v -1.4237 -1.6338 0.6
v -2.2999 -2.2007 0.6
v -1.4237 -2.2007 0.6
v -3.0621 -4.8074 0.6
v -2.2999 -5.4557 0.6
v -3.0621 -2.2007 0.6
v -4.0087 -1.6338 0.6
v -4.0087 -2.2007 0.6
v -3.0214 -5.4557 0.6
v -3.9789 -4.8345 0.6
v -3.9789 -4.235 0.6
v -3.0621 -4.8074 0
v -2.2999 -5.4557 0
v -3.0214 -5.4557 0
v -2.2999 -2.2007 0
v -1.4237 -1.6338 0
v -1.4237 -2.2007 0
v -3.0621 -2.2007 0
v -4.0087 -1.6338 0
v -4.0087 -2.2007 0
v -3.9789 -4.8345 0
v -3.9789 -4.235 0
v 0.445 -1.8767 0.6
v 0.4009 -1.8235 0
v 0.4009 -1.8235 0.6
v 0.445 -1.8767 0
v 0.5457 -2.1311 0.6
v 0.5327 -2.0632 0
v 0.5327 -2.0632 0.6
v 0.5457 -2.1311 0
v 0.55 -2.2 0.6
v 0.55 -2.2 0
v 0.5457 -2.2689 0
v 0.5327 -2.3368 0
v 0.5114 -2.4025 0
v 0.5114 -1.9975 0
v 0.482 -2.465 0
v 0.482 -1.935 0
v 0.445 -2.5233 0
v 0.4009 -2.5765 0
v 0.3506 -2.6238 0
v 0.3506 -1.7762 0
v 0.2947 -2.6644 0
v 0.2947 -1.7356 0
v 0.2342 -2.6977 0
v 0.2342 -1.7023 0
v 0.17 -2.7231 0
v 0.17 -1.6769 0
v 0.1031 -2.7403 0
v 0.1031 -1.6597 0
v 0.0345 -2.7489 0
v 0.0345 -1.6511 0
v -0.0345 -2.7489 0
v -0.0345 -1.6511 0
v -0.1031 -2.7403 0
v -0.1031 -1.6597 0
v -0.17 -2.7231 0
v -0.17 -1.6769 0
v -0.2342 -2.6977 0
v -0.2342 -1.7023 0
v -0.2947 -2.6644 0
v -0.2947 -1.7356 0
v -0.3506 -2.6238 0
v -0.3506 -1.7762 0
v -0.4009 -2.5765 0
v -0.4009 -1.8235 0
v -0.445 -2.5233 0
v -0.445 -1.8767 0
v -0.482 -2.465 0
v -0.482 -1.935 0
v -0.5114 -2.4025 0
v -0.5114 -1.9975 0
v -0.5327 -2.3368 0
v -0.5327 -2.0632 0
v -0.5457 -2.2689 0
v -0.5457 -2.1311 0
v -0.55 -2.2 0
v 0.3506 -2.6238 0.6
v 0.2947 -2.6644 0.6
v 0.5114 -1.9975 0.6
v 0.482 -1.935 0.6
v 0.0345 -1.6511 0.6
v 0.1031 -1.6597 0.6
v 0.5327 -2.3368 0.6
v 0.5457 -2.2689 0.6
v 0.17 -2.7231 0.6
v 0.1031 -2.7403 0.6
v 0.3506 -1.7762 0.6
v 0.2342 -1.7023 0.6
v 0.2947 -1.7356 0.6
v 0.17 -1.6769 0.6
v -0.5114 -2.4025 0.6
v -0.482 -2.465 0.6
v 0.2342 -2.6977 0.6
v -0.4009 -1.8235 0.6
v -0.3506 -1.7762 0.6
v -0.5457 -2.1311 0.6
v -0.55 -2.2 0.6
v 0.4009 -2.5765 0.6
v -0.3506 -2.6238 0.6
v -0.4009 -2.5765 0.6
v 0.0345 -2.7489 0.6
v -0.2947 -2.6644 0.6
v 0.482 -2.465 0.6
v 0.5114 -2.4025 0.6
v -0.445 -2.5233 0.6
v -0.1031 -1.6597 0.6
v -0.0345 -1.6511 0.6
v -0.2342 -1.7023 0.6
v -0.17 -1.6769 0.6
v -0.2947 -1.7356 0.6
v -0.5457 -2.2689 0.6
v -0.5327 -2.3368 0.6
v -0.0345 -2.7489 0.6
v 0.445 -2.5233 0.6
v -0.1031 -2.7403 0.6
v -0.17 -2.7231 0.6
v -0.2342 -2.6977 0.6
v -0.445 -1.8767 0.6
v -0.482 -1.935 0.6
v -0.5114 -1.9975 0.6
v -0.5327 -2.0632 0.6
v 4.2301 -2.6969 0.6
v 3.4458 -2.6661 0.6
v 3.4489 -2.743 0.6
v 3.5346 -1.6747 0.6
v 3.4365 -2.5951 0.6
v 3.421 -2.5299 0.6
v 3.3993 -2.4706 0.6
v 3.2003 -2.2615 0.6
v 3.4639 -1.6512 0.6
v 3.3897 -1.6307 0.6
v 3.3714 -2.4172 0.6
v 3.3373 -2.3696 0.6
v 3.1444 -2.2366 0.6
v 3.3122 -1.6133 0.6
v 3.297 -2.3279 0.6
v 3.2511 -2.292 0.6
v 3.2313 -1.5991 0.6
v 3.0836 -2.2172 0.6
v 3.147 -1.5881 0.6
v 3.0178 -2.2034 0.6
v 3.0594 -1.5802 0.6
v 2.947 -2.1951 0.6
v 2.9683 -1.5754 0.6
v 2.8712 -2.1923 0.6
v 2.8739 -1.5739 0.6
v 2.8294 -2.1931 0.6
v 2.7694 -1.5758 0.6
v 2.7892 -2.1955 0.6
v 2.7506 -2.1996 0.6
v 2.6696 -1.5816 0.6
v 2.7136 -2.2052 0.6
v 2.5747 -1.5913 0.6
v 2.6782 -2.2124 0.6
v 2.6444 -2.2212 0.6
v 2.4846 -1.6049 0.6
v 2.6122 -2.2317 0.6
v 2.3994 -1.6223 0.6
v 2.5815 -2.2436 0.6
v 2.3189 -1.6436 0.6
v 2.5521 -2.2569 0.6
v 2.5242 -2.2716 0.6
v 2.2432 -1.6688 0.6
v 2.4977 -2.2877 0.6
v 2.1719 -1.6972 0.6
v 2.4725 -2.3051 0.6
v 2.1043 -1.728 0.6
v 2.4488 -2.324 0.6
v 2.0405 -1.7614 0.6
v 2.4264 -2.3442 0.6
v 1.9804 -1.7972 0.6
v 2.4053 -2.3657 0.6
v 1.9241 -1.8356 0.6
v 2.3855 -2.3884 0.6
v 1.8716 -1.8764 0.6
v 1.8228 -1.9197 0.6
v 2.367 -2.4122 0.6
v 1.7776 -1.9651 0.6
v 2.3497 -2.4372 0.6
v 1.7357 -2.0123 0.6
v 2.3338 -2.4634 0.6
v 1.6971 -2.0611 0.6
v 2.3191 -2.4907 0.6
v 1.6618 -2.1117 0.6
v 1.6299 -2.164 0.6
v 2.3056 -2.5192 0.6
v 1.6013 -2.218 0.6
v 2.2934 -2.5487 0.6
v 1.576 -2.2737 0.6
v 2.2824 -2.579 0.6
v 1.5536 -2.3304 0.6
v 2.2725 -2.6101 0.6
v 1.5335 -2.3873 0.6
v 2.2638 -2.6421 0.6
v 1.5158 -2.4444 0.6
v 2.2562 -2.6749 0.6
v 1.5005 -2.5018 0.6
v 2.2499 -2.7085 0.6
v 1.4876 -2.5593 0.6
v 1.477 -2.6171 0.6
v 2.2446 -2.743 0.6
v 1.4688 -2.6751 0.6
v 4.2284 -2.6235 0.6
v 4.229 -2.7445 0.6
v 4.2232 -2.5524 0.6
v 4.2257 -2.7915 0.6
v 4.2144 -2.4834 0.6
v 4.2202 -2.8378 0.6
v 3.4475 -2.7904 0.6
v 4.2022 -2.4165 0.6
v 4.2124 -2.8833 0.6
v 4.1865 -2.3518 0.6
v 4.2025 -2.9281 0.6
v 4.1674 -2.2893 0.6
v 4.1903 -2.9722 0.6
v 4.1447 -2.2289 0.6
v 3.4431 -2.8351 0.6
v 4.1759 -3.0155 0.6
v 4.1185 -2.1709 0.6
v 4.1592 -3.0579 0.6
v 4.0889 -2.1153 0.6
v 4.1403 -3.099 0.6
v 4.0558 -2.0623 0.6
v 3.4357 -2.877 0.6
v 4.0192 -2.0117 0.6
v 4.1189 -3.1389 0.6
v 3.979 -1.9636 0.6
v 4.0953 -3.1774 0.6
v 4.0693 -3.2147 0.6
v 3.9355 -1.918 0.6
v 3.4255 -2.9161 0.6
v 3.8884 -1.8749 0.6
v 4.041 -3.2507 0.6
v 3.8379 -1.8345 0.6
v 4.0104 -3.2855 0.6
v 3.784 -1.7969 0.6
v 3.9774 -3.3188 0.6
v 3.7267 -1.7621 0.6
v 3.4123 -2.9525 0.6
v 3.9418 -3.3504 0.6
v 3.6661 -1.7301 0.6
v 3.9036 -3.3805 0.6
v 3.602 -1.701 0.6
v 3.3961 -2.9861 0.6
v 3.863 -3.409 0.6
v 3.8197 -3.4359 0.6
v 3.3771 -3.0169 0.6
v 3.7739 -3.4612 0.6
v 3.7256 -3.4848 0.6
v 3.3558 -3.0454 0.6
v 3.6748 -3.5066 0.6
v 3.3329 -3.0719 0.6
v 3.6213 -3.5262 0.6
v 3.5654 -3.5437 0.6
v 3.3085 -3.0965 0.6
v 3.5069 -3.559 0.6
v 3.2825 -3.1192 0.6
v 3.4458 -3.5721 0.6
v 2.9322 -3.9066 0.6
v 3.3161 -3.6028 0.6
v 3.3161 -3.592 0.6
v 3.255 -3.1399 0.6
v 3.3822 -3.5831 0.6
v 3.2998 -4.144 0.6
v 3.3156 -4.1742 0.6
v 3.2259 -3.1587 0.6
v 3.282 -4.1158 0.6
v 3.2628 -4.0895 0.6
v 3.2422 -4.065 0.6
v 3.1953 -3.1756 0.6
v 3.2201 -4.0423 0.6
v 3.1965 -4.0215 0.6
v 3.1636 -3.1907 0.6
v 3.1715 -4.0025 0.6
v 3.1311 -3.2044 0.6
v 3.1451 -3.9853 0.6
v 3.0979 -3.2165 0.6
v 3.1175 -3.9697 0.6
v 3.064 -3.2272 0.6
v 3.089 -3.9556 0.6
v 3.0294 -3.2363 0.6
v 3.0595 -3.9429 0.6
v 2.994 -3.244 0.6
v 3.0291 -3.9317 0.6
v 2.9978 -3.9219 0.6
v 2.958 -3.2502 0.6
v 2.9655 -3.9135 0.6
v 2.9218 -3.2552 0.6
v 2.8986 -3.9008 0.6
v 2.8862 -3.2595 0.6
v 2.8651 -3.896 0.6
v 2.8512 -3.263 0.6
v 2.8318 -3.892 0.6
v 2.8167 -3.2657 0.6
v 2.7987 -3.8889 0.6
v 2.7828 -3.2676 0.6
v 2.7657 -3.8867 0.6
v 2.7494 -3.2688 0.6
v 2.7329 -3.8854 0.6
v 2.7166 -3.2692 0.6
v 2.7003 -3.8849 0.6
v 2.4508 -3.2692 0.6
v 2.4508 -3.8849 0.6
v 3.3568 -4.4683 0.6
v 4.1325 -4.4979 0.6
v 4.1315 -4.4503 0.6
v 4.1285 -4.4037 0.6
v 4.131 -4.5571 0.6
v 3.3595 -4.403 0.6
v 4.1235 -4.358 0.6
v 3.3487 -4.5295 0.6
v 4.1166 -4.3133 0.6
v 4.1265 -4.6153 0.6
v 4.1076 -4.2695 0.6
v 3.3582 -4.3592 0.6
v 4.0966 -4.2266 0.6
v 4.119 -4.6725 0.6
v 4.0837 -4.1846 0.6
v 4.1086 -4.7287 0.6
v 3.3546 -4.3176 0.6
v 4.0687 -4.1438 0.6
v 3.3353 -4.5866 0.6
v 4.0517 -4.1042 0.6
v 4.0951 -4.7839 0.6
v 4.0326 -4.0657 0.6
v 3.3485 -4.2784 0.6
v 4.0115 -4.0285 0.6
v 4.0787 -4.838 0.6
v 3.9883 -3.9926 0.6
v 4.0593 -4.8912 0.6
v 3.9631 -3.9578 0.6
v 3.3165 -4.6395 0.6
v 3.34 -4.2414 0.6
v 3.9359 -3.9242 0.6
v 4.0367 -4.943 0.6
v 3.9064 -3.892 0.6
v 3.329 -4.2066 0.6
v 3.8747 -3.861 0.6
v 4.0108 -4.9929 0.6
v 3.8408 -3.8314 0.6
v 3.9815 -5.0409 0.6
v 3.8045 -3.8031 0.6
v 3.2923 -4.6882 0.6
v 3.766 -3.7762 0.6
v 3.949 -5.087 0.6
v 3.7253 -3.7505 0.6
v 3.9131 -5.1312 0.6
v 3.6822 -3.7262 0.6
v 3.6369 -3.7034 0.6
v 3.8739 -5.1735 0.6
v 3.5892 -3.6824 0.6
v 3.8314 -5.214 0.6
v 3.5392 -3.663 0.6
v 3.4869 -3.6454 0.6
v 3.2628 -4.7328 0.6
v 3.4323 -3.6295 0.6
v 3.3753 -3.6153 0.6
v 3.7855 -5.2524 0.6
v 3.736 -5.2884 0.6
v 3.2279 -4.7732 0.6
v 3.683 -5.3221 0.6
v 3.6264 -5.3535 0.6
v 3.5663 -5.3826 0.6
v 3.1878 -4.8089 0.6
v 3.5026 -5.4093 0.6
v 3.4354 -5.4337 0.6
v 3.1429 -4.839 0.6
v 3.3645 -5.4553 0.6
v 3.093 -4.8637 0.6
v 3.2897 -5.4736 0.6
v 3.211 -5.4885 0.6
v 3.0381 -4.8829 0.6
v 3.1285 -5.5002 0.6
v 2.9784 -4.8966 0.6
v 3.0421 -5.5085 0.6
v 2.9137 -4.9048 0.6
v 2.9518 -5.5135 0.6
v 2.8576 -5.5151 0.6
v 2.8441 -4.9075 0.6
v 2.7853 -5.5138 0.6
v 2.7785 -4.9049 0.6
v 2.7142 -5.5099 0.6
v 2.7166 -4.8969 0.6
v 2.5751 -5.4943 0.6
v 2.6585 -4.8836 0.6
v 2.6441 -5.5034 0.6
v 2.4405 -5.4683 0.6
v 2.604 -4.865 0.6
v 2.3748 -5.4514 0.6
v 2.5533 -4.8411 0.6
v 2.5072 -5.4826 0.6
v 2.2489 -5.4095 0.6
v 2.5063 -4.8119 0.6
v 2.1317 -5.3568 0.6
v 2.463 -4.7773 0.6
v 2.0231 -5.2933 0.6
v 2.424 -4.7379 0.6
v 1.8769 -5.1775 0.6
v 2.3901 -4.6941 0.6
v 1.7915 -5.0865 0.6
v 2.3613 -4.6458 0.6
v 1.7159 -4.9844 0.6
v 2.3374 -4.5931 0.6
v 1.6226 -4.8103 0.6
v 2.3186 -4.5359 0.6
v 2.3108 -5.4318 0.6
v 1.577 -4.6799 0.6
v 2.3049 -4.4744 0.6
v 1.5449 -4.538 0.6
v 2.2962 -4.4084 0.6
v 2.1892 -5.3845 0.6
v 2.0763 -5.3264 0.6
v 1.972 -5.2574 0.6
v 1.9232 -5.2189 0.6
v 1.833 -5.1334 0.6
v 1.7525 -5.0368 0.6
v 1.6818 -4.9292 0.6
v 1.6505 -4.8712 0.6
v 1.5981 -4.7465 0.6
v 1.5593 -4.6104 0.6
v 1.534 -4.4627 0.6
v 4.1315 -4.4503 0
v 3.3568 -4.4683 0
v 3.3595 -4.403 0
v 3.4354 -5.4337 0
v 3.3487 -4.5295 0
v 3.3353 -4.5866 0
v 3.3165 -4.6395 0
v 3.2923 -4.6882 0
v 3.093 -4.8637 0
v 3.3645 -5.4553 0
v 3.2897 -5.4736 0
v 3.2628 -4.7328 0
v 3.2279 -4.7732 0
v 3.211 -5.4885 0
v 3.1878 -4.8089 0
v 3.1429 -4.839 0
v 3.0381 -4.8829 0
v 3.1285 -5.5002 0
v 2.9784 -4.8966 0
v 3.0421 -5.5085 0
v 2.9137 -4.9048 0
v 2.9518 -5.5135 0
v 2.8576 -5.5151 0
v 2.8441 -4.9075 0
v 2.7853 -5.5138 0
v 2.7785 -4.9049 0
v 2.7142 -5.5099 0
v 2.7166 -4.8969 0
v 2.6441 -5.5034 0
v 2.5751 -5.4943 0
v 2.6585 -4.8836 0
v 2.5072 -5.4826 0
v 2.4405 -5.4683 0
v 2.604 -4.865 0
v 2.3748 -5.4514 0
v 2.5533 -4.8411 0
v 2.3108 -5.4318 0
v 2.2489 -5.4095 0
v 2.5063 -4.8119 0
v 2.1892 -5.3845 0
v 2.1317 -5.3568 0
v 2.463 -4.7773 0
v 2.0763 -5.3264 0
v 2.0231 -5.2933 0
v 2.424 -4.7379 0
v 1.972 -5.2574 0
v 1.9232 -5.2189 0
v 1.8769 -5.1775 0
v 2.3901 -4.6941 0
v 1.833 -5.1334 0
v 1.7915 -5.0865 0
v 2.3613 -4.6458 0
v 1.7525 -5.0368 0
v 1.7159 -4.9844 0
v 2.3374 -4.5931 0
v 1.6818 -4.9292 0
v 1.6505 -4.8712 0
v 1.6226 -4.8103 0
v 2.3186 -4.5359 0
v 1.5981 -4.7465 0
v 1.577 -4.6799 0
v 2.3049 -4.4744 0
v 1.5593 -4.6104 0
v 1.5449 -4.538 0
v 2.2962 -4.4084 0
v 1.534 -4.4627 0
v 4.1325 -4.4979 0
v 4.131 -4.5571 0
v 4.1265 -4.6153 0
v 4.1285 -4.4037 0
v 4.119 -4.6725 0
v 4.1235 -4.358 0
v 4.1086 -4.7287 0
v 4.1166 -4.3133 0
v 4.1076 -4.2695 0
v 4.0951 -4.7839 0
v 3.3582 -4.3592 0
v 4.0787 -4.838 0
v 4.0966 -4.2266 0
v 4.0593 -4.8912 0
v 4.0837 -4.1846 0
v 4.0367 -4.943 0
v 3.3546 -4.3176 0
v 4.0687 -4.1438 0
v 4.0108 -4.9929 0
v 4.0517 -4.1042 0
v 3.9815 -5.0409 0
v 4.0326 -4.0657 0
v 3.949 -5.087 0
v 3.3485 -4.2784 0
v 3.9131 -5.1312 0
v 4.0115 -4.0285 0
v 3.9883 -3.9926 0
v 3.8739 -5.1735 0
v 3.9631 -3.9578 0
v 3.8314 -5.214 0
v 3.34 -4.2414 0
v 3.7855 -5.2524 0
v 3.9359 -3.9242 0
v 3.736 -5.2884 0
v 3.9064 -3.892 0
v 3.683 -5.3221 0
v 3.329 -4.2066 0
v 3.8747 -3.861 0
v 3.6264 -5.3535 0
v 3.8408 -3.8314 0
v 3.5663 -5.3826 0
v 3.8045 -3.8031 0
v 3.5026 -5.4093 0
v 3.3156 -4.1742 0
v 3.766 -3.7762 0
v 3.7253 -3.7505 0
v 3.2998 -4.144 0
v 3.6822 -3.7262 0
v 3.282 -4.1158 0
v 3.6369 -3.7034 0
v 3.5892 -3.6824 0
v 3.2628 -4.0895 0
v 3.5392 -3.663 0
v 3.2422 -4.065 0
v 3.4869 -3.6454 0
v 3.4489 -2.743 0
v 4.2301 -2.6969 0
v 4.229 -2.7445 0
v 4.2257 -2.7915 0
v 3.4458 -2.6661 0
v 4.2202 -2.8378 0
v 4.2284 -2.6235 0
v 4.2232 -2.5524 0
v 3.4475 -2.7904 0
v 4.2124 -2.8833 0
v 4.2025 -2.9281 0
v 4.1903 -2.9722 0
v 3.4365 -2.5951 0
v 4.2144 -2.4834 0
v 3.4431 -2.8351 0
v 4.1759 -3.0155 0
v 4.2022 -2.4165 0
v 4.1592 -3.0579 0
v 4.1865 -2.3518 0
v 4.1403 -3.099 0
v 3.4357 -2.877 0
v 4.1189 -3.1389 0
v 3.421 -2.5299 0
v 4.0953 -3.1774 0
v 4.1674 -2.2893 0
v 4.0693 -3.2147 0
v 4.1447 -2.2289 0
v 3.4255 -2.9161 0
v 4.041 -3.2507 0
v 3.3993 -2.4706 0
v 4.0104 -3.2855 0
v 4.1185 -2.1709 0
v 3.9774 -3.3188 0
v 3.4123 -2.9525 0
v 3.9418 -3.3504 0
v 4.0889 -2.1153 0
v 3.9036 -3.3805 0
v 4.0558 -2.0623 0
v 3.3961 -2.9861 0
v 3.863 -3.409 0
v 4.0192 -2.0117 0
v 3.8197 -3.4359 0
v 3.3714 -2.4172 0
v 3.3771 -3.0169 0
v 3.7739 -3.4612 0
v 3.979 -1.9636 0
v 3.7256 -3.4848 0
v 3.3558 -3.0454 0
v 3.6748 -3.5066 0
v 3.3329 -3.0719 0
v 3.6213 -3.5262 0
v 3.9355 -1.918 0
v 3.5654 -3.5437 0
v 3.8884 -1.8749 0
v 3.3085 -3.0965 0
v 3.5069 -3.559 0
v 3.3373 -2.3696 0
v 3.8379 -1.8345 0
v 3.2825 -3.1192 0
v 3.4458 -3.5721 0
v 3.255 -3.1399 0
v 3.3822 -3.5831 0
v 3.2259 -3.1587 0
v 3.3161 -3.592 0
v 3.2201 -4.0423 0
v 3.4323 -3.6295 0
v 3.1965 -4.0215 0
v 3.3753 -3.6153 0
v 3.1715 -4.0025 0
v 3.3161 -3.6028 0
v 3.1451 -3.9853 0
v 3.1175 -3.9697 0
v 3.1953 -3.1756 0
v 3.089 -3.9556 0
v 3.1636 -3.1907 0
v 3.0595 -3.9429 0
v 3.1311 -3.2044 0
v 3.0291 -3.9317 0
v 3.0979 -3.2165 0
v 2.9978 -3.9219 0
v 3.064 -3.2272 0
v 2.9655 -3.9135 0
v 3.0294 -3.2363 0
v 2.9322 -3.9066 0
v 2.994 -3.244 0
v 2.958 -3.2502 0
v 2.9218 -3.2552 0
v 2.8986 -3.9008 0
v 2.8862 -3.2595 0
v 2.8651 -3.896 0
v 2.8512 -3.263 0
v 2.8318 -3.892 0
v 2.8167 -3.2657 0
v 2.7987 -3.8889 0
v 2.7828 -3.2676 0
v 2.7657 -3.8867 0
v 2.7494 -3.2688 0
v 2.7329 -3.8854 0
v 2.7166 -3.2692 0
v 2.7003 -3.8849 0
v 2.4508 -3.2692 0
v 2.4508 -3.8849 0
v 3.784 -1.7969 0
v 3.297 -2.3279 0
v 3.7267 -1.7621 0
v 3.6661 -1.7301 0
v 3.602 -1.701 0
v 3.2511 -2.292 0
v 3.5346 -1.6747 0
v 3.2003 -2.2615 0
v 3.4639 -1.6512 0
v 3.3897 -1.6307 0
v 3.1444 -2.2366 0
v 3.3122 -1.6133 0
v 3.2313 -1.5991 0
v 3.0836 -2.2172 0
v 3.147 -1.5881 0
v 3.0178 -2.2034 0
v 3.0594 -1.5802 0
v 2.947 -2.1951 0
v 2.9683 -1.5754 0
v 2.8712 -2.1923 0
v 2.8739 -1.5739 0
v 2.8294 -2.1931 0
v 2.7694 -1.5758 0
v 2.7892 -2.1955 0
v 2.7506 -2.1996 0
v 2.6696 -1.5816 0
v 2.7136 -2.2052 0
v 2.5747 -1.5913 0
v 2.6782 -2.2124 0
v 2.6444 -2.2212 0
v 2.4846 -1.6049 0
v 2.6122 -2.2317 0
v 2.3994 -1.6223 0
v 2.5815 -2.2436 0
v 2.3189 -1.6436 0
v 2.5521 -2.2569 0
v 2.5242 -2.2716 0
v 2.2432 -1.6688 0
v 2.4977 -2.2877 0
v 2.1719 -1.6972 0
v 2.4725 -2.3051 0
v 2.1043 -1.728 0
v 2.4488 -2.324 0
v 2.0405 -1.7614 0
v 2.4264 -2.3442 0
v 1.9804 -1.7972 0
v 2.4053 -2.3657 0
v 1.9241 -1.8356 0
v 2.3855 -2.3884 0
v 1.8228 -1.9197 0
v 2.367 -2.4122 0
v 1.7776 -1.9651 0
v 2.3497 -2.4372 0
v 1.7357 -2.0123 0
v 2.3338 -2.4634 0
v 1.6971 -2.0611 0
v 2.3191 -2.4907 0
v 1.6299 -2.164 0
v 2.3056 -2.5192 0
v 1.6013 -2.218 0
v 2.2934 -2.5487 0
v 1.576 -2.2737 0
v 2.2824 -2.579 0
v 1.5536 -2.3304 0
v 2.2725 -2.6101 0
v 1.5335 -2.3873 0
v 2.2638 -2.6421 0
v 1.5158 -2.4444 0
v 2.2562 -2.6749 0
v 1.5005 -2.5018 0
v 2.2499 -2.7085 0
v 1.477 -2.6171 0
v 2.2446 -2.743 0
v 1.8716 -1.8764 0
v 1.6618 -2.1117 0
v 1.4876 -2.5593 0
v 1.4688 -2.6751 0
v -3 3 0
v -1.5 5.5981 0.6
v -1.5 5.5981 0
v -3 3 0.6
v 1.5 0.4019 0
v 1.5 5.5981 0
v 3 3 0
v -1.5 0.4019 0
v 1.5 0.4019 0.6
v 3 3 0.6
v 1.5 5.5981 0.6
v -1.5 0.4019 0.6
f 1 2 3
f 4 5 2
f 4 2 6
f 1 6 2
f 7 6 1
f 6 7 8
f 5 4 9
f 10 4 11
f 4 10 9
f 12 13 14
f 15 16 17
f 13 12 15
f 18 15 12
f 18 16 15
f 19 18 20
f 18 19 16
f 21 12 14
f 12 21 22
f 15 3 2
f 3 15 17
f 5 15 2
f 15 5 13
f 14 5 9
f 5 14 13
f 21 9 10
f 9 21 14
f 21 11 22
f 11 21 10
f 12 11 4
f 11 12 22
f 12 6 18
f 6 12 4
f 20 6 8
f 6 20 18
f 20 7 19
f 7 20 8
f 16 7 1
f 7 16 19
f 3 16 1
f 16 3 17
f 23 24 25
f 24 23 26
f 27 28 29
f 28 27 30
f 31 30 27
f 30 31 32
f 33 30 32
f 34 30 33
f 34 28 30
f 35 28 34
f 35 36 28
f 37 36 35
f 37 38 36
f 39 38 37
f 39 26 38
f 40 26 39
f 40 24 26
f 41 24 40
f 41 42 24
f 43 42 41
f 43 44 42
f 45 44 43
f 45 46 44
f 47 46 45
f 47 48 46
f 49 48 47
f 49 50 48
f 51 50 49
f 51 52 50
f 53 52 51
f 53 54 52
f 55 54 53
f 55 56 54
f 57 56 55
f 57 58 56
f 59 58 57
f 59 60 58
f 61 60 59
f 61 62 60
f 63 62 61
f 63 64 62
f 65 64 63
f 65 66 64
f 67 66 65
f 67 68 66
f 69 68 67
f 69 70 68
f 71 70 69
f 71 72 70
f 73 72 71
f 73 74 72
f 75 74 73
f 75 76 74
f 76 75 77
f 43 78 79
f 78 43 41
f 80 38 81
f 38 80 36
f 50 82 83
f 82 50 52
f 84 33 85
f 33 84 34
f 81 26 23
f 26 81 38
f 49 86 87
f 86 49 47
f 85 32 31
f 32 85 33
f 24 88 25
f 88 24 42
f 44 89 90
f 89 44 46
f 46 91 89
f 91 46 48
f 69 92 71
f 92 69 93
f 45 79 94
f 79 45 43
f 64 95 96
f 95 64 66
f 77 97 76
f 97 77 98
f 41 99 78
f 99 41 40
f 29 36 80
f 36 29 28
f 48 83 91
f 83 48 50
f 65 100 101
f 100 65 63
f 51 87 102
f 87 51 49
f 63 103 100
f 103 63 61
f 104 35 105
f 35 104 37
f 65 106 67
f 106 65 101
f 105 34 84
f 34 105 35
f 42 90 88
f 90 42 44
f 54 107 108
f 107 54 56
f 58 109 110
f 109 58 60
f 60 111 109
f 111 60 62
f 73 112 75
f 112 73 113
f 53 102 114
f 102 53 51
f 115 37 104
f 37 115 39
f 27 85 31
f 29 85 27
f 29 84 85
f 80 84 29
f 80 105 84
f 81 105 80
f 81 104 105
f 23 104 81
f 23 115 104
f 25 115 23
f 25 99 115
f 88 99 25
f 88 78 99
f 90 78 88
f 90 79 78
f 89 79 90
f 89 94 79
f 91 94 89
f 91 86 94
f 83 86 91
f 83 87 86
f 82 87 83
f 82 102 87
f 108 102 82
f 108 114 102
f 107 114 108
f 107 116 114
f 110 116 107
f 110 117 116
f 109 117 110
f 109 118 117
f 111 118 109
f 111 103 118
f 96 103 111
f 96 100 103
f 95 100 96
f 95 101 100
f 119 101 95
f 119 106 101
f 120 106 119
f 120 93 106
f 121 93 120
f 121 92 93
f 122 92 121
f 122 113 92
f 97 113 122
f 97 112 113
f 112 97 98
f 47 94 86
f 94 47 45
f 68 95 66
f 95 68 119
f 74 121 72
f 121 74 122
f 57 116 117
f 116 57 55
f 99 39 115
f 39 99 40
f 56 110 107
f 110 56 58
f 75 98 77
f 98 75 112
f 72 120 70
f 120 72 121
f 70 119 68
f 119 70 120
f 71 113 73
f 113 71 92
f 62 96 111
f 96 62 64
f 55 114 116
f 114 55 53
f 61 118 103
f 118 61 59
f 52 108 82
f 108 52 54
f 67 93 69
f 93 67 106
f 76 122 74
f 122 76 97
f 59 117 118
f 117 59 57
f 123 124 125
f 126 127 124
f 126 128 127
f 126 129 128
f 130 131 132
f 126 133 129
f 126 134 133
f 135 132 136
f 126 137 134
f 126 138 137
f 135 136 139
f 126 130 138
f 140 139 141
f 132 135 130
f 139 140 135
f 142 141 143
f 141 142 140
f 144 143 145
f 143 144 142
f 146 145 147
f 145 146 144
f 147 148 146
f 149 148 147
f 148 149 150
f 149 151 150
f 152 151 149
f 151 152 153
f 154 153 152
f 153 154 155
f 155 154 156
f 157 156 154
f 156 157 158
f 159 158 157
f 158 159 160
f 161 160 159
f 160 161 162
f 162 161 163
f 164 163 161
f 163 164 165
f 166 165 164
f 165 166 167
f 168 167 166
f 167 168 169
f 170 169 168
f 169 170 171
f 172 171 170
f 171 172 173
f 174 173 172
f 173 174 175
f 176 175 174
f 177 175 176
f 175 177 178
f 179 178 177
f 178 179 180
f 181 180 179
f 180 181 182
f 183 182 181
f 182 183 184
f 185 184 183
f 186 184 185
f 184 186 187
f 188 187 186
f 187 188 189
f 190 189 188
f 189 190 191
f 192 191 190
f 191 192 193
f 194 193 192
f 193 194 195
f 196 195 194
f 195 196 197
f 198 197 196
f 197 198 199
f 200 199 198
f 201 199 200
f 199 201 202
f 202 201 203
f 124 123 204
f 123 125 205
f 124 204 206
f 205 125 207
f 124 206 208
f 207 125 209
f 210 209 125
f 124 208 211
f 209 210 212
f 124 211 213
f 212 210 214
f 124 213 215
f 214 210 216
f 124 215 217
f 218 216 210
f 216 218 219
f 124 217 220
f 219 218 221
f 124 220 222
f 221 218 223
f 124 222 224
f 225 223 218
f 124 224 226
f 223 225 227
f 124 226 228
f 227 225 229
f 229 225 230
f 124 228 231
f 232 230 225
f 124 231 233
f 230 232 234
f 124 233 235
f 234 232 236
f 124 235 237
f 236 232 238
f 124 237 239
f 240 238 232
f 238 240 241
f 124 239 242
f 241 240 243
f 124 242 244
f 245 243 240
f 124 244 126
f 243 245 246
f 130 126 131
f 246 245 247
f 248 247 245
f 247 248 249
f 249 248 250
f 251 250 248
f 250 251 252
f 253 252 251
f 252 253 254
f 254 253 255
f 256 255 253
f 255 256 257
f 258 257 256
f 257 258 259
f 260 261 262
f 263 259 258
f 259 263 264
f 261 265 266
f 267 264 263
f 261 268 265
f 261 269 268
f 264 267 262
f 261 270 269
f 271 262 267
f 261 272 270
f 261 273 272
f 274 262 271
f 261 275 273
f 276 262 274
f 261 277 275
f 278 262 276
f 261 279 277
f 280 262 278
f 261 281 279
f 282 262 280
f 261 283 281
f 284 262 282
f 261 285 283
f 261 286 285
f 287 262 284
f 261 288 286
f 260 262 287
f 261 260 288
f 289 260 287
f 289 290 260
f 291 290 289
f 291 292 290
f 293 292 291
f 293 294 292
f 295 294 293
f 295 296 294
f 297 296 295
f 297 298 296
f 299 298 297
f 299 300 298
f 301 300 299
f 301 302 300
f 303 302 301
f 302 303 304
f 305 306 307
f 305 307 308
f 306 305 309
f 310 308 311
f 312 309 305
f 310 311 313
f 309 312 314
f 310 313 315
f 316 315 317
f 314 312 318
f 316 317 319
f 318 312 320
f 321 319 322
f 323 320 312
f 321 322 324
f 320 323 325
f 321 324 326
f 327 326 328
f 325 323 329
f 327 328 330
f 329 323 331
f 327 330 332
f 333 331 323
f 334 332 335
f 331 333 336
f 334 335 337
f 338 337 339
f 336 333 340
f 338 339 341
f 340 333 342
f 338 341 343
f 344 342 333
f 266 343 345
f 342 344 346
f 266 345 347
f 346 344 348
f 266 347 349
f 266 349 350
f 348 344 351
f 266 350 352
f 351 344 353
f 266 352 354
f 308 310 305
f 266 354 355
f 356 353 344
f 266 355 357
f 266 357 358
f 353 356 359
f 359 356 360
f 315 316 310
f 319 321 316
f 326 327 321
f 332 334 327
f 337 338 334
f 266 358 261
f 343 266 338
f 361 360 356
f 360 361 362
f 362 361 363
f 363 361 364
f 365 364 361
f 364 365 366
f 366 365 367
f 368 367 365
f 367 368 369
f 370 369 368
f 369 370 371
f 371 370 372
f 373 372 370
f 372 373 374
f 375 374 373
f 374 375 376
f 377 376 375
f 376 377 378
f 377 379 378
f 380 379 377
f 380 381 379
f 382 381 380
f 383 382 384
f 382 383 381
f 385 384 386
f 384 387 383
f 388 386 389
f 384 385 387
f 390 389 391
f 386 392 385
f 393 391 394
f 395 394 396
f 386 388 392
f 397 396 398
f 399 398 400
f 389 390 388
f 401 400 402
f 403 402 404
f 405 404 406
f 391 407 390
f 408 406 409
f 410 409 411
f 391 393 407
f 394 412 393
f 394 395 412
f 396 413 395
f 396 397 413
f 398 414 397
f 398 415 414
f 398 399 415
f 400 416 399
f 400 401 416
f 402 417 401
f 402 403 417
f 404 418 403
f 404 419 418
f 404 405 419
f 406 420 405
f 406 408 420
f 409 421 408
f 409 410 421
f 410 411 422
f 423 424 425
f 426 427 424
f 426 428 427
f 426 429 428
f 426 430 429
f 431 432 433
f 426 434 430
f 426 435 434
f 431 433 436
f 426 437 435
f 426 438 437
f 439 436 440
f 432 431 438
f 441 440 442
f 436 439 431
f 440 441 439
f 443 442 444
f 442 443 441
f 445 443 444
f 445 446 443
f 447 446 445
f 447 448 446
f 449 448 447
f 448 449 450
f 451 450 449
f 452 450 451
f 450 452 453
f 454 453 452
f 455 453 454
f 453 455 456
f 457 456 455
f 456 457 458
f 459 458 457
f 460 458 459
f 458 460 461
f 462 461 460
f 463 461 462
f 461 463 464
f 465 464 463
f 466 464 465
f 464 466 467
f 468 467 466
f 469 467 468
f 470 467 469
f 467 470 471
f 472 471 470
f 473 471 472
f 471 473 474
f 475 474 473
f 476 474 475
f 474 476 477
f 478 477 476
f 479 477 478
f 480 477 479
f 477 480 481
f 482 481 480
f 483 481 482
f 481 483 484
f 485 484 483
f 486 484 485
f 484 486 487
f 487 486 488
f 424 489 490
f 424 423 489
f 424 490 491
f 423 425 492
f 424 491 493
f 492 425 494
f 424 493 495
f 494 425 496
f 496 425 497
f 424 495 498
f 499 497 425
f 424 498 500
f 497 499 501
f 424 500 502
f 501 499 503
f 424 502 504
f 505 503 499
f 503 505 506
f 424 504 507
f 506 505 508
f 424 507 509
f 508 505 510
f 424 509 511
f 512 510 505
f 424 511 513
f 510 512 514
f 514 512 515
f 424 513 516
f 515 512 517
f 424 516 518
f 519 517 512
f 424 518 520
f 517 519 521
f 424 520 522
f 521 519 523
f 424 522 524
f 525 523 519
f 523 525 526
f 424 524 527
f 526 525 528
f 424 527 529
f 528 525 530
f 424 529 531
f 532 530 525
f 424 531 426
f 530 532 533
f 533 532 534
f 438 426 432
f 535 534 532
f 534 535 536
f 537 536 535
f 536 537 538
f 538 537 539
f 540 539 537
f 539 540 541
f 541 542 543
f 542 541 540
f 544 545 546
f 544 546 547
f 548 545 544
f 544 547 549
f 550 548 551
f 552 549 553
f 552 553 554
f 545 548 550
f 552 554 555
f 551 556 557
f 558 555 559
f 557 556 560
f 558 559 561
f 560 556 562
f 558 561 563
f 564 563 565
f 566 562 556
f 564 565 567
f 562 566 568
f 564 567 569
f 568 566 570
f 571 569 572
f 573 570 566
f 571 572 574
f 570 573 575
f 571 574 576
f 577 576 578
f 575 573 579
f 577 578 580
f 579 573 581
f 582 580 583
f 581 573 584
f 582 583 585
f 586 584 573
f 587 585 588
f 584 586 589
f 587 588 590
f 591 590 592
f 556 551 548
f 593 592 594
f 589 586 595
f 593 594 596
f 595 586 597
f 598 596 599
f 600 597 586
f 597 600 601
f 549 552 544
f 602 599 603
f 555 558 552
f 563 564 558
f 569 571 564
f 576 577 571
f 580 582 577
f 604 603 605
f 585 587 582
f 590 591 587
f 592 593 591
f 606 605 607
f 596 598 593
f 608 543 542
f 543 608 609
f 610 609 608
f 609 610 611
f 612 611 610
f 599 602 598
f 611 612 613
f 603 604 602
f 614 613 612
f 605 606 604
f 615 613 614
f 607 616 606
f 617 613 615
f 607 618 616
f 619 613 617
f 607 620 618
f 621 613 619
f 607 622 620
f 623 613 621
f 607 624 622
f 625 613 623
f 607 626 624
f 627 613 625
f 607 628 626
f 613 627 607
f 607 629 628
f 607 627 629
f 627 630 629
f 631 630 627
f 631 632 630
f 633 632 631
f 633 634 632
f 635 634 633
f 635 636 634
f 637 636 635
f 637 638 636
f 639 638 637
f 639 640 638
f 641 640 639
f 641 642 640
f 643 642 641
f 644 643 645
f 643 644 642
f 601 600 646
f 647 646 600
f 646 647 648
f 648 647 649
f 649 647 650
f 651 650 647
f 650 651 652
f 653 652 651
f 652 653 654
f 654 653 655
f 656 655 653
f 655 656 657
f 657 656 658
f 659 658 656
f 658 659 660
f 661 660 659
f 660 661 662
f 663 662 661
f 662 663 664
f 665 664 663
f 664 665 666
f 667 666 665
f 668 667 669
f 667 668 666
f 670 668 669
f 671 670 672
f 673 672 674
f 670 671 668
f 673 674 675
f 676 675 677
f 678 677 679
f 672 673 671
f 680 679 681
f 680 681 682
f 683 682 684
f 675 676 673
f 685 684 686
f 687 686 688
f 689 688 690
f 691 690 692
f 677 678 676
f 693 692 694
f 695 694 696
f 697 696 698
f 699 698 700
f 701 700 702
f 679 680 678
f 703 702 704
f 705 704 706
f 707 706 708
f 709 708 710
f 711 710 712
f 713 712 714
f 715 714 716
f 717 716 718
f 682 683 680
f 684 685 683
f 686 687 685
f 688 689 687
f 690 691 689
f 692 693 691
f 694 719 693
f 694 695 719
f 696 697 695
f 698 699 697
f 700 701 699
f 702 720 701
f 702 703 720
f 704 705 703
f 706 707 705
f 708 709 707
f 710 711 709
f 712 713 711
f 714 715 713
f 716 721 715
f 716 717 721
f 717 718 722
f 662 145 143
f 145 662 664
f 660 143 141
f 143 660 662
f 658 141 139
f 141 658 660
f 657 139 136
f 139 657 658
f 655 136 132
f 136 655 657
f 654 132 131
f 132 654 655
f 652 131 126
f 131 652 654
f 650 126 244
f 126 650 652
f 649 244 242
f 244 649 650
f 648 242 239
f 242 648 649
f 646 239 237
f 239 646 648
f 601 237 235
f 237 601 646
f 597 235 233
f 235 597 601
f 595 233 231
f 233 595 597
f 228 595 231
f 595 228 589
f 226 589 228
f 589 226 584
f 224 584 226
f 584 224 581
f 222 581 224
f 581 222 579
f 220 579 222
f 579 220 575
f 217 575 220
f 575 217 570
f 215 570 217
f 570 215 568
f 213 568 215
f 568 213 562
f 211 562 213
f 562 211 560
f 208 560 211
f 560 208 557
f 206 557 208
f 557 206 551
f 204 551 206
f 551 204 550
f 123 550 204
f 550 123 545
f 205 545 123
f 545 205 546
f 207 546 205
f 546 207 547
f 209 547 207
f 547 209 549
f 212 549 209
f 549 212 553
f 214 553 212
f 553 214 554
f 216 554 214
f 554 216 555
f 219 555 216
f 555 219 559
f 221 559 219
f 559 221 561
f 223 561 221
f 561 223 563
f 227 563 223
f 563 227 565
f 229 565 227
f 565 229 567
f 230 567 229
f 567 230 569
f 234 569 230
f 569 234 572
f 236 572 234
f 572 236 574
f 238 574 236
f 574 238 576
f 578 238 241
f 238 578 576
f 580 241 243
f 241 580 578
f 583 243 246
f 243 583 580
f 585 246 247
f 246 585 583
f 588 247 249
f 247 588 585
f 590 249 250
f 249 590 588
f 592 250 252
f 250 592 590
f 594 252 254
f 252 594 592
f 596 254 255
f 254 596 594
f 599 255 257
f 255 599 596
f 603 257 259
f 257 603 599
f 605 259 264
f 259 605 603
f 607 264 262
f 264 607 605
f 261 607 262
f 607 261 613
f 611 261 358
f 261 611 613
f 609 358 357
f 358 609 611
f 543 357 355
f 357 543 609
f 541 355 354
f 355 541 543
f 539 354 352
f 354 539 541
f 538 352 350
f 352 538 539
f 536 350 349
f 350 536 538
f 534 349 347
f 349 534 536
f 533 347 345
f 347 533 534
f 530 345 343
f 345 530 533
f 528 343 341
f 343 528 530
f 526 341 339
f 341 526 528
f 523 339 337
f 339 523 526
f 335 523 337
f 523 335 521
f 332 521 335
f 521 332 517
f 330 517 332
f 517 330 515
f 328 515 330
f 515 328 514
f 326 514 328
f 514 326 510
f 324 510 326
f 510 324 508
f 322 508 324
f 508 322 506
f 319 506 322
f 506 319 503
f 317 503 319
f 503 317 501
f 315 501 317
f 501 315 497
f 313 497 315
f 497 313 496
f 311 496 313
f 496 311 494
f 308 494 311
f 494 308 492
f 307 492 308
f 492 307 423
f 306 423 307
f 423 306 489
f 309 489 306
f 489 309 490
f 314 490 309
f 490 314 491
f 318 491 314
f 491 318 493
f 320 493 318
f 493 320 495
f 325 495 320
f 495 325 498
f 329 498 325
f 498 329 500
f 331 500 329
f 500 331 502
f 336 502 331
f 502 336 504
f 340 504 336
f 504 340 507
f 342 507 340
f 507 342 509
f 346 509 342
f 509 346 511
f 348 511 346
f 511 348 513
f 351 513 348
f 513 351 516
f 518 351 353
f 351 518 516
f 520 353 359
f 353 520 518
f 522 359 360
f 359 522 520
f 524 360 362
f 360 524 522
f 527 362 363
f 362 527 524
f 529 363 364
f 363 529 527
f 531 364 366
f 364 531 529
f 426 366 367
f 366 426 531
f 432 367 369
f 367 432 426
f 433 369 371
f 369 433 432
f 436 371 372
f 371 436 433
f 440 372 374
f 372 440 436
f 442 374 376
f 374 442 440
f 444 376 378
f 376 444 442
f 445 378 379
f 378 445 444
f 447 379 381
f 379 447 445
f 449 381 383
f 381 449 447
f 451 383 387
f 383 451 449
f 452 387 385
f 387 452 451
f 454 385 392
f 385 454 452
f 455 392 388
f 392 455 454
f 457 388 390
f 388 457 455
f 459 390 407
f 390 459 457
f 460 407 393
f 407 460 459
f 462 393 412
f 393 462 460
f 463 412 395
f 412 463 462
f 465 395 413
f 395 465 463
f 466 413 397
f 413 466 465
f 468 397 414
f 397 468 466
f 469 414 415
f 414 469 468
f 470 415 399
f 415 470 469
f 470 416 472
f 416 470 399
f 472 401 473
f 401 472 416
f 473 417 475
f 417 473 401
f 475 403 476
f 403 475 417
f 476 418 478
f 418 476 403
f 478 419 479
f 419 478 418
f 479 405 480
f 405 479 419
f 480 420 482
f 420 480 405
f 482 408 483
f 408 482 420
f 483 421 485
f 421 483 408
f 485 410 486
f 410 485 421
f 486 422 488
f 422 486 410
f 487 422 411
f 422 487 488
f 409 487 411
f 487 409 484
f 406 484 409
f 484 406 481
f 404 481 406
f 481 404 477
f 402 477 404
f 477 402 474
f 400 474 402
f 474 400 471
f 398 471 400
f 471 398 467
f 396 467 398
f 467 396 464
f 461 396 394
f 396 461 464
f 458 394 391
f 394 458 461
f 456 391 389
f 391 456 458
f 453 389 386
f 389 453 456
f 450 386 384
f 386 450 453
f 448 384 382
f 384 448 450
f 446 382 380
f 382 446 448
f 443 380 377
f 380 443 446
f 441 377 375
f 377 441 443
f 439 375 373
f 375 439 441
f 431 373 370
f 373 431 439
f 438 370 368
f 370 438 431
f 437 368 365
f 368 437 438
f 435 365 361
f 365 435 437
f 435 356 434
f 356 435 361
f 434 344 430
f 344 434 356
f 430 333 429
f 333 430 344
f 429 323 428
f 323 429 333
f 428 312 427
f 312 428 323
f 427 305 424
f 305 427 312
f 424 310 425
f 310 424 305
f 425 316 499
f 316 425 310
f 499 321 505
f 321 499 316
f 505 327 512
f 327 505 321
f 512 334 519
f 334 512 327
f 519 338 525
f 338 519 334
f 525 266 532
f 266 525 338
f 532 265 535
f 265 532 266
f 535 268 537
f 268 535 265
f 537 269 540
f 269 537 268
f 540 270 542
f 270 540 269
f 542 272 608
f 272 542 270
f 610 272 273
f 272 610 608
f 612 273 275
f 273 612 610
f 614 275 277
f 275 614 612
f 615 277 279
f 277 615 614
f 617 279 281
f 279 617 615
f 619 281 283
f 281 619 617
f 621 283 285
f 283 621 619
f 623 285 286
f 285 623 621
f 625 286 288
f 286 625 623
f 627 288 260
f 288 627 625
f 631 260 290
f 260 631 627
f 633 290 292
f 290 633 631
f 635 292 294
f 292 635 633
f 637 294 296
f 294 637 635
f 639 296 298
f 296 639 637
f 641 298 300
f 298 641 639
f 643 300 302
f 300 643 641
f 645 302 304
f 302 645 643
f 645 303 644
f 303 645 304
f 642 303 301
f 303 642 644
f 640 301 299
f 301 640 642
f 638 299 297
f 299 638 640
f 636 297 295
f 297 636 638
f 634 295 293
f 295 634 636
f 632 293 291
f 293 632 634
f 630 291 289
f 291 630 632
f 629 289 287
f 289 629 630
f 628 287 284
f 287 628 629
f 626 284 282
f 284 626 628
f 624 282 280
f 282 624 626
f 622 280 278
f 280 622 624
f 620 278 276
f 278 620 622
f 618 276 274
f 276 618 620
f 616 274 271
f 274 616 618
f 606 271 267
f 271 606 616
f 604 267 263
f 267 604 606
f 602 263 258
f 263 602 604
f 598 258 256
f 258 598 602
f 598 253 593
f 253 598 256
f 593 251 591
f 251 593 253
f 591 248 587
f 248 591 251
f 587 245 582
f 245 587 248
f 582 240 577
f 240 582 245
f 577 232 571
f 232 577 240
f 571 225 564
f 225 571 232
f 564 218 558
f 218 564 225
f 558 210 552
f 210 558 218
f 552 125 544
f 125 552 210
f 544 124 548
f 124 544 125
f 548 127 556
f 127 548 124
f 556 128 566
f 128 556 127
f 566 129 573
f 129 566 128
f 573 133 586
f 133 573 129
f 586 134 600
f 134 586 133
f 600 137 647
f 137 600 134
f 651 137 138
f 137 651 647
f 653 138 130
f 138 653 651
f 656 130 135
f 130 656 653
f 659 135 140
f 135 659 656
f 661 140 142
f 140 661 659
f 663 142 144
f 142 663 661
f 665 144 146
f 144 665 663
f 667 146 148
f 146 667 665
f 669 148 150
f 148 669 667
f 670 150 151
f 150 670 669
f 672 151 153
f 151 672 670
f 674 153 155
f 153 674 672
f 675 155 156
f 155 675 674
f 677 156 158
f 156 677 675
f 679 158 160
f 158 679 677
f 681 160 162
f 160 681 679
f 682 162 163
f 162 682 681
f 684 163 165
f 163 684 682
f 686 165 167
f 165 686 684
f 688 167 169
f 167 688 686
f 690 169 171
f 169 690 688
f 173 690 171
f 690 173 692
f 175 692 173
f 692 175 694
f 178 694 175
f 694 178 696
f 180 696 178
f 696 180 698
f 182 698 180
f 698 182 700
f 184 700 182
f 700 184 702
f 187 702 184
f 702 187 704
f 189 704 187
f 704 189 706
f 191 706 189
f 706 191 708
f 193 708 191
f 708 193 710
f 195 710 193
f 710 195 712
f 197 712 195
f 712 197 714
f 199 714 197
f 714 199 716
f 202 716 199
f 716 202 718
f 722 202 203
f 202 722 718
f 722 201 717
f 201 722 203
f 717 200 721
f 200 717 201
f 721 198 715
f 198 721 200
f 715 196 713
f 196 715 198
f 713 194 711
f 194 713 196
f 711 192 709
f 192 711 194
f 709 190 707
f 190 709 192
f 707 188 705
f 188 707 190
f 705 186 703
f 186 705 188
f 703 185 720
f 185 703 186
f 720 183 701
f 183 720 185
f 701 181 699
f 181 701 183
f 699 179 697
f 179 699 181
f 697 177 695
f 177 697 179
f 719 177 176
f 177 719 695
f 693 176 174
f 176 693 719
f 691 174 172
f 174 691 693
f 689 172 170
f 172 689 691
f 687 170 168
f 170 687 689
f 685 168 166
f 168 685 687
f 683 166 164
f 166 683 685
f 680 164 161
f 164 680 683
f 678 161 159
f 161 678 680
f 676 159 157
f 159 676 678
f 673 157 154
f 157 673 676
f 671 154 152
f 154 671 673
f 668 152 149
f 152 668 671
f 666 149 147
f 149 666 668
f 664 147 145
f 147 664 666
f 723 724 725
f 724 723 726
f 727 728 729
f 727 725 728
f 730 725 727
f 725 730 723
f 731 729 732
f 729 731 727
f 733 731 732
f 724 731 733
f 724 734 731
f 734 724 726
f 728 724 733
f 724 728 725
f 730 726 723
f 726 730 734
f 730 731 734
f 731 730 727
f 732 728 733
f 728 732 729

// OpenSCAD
$fn = 50;

difference() {
	union() {
		translate(v = [-2.85, -3.5, 0.6]) {
			rotate(a = [180, 0, 0]) {
				linear_extrude(height = 0.6) {
					text(font = "Liberation Sans:style=Bold", halign = "center", size = 4.0, text = "1", valign = "center");
				}
			}
		}
		translate(v = [0.0, -2.2, 0.0]) {
			cylinder(h = 0.6, r = 0.55);
		}
		translate(v = [2.85, -3.5, 0.6]) {
			rotate(a = [180, 0, 0]) {
				linear_extrude(height = 0.6) {
					text(font = "Liberation Sans:style=Bold", halign = "center", size = 4.0, text = "3", valign = "center");
				}
			}
		}
		translate(v = [0, 3, 0]) {
			linear_extrude(height = 0.6) {
				polygon(points = [[3.0, 0.0], [1.5000000000000004, 2.598076211353316], [-1.4999999999999993, 2.598076211353316], [-3.0, 3.6739403974420594e-16], [-1.5000000000000013, -2.5980762113533156], [1.499999999999998, -2.598076211353317]]);
			}
		}
	}
	union();
}
